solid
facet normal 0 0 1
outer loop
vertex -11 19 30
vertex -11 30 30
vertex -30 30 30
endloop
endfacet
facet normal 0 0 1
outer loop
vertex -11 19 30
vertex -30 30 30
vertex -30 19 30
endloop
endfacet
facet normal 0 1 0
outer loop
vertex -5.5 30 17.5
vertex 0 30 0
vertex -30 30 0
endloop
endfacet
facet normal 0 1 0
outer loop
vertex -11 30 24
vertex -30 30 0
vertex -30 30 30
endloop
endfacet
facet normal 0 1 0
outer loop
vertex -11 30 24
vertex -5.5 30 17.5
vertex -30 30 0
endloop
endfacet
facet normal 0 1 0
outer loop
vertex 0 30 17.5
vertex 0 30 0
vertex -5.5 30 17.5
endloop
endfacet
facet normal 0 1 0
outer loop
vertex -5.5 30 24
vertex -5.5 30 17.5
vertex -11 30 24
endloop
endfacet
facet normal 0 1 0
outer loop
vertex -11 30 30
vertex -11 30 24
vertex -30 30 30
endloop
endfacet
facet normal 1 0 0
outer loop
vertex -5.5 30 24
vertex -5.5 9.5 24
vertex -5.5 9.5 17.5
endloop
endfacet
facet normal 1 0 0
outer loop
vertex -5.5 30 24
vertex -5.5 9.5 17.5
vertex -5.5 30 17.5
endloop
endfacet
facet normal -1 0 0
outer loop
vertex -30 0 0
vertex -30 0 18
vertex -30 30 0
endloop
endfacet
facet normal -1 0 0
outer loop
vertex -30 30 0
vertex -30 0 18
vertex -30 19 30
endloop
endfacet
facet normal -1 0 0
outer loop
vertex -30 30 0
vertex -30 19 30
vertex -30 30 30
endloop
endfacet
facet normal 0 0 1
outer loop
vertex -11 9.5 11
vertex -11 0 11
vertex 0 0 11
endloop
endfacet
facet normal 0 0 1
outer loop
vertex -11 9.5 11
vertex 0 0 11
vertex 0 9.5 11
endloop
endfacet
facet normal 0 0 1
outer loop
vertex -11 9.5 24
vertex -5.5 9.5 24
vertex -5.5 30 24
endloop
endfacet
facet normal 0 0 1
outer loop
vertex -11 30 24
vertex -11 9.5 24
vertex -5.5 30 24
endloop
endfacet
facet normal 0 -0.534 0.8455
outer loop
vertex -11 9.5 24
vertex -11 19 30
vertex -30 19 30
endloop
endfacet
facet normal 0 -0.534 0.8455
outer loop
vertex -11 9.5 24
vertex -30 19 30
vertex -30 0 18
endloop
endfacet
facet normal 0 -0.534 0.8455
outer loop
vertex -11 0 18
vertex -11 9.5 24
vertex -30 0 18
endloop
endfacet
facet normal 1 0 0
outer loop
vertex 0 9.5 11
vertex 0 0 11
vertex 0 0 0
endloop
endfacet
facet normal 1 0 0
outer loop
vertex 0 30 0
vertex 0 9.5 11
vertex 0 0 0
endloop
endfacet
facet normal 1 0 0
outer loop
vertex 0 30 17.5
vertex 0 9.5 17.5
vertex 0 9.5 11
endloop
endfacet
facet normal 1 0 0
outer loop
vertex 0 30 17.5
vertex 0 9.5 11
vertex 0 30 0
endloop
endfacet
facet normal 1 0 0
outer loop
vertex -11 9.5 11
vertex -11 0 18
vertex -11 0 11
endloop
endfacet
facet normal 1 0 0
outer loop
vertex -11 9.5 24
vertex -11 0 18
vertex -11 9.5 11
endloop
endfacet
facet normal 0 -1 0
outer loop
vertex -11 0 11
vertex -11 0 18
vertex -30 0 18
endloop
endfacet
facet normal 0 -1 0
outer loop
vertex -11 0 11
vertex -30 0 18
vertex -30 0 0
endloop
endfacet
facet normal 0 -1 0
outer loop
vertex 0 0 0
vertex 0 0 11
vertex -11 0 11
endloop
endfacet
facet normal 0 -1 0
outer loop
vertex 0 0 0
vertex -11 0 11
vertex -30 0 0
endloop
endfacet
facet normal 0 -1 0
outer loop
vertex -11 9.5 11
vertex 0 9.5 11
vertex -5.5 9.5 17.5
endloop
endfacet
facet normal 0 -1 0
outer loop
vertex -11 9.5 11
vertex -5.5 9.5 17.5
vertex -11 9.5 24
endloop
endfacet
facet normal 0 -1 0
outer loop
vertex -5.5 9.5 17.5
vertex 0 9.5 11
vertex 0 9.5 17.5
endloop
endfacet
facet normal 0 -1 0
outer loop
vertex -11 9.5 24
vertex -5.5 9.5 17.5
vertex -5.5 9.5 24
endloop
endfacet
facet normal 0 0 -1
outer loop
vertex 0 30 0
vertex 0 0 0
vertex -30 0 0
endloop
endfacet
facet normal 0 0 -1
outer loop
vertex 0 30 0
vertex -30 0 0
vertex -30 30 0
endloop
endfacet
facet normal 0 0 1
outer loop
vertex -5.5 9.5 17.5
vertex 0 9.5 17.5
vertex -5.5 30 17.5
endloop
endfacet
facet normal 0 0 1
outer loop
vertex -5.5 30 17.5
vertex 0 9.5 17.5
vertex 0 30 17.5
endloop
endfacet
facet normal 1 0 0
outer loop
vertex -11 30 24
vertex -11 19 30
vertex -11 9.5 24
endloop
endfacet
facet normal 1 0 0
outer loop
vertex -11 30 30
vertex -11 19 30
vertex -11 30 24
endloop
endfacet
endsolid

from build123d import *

# Parameters (mm, degrees)
F0_W     = 20.5
F0_H     = 6.5
F1_DEPTH = 30
F2_DEPTH = 11
F3_DEPTH = 5.5


with BuildPart() as f1:
    # F0 (on Right) → F1 (new body)
    with BuildSketch(Plane.YZ):
        Polygon((0, 11), (0, 0), (30, 0), (30, 17.5), (9.5, 17.5), (9.5, 11), align=None)
        with Locations((19.75, 20.75)):
            Rectangle(F0_W, F0_H)
        Polygon((9.5, 24), (30, 24), (30, 30), (19, 30), align=None)
        Polygon((0, 18), (0, 11), (9.5, 11), (9.5, 17.5), (9.5, 24), align=None)
    extrude(amount=-F1_DEPTH)

    # F0 (on Right) → F2 (cut)
    with BuildSketch(Plane.YZ):
        Polygon((9.5, 24), (30, 24), (30, 30), (19, 30), align=None)
        Polygon((0, 18), (0, 11), (9.5, 11), (9.5, 17.5), (9.5, 24), align=None)
    extrude(amount=-F2_DEPTH, mode=Mode.SUBTRACT)

    # F0 (on Right) → F3 (cut)
    with BuildSketch(Plane.YZ):
        with Locations((19.75, 20.75)):
            Rectangle(F0_W, F0_H)
    extrude(amount=-F3_DEPTH, mode=Mode.SUBTRACT)


solid = f1.part
